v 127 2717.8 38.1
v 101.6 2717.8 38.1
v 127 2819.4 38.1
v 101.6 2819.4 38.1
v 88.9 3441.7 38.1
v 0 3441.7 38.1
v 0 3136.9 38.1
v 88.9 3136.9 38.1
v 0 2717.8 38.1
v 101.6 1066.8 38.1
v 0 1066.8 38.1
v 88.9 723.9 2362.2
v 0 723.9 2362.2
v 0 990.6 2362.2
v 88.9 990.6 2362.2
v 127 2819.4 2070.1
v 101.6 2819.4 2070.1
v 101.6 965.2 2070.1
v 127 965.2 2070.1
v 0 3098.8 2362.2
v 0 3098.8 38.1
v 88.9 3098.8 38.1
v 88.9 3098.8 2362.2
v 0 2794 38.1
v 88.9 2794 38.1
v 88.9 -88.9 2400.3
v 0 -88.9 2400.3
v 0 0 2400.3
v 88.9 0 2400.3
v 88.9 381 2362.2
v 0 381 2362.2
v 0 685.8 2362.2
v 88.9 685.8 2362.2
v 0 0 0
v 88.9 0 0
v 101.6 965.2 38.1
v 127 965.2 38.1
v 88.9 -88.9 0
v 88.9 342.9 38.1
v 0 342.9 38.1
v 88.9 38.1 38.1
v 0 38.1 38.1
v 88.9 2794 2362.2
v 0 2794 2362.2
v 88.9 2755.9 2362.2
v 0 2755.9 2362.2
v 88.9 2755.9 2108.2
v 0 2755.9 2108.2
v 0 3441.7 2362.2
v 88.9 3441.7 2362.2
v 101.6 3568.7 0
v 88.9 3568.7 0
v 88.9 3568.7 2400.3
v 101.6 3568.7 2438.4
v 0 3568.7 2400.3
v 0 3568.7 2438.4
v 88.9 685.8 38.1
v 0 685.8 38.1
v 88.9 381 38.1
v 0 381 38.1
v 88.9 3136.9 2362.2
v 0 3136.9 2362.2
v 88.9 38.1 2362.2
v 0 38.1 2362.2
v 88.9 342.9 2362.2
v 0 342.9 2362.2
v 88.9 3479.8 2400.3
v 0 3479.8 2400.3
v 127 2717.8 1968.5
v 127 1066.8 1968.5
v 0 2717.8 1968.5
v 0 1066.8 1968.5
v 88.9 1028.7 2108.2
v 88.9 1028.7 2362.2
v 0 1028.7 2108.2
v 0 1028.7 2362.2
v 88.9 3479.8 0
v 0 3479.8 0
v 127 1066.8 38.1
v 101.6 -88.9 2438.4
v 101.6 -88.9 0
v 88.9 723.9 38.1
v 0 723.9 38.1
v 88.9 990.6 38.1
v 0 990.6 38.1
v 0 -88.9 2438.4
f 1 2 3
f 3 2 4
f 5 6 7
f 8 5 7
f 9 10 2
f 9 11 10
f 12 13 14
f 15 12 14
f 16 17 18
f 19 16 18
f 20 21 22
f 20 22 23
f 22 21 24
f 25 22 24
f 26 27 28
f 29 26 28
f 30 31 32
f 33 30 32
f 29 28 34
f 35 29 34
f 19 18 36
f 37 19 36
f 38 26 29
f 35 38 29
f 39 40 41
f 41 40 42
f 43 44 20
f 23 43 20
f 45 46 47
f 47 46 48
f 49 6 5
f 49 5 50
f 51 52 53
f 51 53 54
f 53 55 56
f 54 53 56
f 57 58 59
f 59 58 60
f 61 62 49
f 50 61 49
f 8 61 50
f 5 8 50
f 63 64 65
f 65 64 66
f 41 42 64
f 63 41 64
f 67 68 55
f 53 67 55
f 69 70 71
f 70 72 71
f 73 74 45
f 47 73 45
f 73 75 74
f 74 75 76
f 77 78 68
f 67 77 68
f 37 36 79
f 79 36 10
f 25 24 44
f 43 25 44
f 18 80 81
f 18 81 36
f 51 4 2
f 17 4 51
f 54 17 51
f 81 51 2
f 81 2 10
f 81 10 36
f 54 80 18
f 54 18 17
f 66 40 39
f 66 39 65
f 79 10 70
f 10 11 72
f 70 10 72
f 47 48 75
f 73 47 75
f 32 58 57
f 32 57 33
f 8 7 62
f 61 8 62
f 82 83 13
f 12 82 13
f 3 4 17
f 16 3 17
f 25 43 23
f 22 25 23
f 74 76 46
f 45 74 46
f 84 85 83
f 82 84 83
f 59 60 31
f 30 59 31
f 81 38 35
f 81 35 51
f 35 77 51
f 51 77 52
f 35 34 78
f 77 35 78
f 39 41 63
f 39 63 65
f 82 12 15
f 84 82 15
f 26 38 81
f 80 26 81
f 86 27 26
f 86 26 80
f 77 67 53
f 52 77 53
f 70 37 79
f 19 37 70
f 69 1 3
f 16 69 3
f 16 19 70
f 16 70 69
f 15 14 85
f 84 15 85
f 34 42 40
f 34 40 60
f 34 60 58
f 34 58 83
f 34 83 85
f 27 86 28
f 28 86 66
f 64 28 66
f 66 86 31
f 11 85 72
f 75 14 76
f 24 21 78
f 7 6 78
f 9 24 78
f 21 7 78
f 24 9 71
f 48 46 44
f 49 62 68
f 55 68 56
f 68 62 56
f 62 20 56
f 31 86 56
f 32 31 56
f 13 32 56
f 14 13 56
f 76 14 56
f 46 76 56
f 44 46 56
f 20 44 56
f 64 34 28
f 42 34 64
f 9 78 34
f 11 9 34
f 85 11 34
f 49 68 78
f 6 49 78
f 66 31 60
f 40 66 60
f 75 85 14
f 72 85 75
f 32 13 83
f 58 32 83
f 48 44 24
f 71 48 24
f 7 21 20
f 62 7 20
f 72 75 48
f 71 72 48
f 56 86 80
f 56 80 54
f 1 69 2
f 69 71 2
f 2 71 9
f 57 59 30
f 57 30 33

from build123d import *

# Parameters (mm, degrees)
F0_W     = 38.1
F0_H     = 2324.1
F0_H_2   = 1930.4
F1_DEPTH = 88.9
F2_W     = 3657.6
F2_H     = 2438.4
F2_W_2   = 1651
F2_H_2   = 1930.4
F3_DEPTH = 12.7
F5_DEPTH = 25.4


# Not quite as in the source:
# - a feature names something its author has since deleted; it is built from what else it names


with BuildPart() as f1:
    # F0 (on Right) → F1 (new body)
    with BuildSketch(Plane.YZ):
        with Locations((19.05, 1200.15)):
            Rectangle(F0_W, F0_H)
        with Locations((361.95, 1200.15)):
            Rectangle(F0_W, F0_H)
        Polygon((990.6, 2362.2), (990.6, 38.1), (1028.7, 38.1), (1028.7, 1968.5), (1028.7, 2108.2), (1028.7, 2362.2), align=None)
        with Locations((1047.75, 1003.3)):
            Rectangle(F0_W, F0_H_2)
        Polygon((2717.8, 1968.5), (2755.9, 1968.5), (2755.9, 2108.2), (1028.7, 2108.2), (1028.7, 1968.5), (1066.8, 1968.5), align=None)
        with Locations((2736.85, 1003.3)):
            Rectangle(F0_W, F0_H_2)
        Polygon((2755.9, 38.1), (2794, 38.1), (2794, 2362.2), (2755.9, 2362.2), (2755.9, 2108.2), (2755.9, 1968.5), align=None)
        with Locations((3460.75, 1200.15)):
            Rectangle(F0_W, F0_H)
        Polygon((0, 2400.3), (0, 2362.2), (38.1, 2362.2), (342.9, 2362.2), (381, 2362.2), (685.8, 2362.2), (723.9, 2362.2), (990.6, 2362.2), (1028.7, 2362.2), (2755.9, 2362.2), (2794, 2362.2), (3098.8, 2362.2), (3136.9, 2362.2), (3441.7, 2362.2), (3479.8, 2362.2), (3479.8, 2400.3), align=None)
        Polygon((-88.9, 2400.3), (0, 2400.3), (3479.8, 2400.3), (3568.7, 2400.3), (3568.7, 2438.4), (-88.9, 2438.4), align=None)
        Polygon((0, 38.1), (0, 0), (3479.8, 0), (3479.8, 38.1), (3441.7, 38.1), (3136.9, 38.1), (3098.8, 38.1), (2794, 38.1), (2755.9, 38.1), (2717.8, 38.1), (1066.8, 38.1), (1028.7, 38.1), (990.6, 38.1), (723.9, 38.1), (685.8, 38.1), (381, 38.1), (342.9, 38.1), (38.1, 38.1), align=None)
        with Locations((704.85, 1200.15)):
            Rectangle(F0_W, F0_H)
        with Locations((3117.85, 1200.15)):
            Rectangle(F0_W, F0_H)
    extrude(amount=F1_DEPTH)

    # F2 (on face) → F3 (join)
    with BuildSketch(Plane.YZ.offset(88.9)):
        with Locations((1739.9, 1219.2)):
            Rectangle(F2_W, F2_H)
        with Locations((1892.3, 1003.3)):
            Rectangle(F2_W_2, F2_H_2, mode=Mode.SUBTRACT)
    extrude(amount=F3_DEPTH)

    # F4 (on face) → F5 (join)
    with BuildSketch(Plane.YZ.offset(101.6)):
        Polygon((1066.8, 38.1), (1066.8, 1968.5), (2717.8, 1968.5), (2717.8, 38.1), (2819.4, 38.1), (2819.4, 2070.1), (965.2, 2070.1), (965.2, 38.1), align=None)
    extrude(amount=F5_DEPTH)


solid = f1.part
